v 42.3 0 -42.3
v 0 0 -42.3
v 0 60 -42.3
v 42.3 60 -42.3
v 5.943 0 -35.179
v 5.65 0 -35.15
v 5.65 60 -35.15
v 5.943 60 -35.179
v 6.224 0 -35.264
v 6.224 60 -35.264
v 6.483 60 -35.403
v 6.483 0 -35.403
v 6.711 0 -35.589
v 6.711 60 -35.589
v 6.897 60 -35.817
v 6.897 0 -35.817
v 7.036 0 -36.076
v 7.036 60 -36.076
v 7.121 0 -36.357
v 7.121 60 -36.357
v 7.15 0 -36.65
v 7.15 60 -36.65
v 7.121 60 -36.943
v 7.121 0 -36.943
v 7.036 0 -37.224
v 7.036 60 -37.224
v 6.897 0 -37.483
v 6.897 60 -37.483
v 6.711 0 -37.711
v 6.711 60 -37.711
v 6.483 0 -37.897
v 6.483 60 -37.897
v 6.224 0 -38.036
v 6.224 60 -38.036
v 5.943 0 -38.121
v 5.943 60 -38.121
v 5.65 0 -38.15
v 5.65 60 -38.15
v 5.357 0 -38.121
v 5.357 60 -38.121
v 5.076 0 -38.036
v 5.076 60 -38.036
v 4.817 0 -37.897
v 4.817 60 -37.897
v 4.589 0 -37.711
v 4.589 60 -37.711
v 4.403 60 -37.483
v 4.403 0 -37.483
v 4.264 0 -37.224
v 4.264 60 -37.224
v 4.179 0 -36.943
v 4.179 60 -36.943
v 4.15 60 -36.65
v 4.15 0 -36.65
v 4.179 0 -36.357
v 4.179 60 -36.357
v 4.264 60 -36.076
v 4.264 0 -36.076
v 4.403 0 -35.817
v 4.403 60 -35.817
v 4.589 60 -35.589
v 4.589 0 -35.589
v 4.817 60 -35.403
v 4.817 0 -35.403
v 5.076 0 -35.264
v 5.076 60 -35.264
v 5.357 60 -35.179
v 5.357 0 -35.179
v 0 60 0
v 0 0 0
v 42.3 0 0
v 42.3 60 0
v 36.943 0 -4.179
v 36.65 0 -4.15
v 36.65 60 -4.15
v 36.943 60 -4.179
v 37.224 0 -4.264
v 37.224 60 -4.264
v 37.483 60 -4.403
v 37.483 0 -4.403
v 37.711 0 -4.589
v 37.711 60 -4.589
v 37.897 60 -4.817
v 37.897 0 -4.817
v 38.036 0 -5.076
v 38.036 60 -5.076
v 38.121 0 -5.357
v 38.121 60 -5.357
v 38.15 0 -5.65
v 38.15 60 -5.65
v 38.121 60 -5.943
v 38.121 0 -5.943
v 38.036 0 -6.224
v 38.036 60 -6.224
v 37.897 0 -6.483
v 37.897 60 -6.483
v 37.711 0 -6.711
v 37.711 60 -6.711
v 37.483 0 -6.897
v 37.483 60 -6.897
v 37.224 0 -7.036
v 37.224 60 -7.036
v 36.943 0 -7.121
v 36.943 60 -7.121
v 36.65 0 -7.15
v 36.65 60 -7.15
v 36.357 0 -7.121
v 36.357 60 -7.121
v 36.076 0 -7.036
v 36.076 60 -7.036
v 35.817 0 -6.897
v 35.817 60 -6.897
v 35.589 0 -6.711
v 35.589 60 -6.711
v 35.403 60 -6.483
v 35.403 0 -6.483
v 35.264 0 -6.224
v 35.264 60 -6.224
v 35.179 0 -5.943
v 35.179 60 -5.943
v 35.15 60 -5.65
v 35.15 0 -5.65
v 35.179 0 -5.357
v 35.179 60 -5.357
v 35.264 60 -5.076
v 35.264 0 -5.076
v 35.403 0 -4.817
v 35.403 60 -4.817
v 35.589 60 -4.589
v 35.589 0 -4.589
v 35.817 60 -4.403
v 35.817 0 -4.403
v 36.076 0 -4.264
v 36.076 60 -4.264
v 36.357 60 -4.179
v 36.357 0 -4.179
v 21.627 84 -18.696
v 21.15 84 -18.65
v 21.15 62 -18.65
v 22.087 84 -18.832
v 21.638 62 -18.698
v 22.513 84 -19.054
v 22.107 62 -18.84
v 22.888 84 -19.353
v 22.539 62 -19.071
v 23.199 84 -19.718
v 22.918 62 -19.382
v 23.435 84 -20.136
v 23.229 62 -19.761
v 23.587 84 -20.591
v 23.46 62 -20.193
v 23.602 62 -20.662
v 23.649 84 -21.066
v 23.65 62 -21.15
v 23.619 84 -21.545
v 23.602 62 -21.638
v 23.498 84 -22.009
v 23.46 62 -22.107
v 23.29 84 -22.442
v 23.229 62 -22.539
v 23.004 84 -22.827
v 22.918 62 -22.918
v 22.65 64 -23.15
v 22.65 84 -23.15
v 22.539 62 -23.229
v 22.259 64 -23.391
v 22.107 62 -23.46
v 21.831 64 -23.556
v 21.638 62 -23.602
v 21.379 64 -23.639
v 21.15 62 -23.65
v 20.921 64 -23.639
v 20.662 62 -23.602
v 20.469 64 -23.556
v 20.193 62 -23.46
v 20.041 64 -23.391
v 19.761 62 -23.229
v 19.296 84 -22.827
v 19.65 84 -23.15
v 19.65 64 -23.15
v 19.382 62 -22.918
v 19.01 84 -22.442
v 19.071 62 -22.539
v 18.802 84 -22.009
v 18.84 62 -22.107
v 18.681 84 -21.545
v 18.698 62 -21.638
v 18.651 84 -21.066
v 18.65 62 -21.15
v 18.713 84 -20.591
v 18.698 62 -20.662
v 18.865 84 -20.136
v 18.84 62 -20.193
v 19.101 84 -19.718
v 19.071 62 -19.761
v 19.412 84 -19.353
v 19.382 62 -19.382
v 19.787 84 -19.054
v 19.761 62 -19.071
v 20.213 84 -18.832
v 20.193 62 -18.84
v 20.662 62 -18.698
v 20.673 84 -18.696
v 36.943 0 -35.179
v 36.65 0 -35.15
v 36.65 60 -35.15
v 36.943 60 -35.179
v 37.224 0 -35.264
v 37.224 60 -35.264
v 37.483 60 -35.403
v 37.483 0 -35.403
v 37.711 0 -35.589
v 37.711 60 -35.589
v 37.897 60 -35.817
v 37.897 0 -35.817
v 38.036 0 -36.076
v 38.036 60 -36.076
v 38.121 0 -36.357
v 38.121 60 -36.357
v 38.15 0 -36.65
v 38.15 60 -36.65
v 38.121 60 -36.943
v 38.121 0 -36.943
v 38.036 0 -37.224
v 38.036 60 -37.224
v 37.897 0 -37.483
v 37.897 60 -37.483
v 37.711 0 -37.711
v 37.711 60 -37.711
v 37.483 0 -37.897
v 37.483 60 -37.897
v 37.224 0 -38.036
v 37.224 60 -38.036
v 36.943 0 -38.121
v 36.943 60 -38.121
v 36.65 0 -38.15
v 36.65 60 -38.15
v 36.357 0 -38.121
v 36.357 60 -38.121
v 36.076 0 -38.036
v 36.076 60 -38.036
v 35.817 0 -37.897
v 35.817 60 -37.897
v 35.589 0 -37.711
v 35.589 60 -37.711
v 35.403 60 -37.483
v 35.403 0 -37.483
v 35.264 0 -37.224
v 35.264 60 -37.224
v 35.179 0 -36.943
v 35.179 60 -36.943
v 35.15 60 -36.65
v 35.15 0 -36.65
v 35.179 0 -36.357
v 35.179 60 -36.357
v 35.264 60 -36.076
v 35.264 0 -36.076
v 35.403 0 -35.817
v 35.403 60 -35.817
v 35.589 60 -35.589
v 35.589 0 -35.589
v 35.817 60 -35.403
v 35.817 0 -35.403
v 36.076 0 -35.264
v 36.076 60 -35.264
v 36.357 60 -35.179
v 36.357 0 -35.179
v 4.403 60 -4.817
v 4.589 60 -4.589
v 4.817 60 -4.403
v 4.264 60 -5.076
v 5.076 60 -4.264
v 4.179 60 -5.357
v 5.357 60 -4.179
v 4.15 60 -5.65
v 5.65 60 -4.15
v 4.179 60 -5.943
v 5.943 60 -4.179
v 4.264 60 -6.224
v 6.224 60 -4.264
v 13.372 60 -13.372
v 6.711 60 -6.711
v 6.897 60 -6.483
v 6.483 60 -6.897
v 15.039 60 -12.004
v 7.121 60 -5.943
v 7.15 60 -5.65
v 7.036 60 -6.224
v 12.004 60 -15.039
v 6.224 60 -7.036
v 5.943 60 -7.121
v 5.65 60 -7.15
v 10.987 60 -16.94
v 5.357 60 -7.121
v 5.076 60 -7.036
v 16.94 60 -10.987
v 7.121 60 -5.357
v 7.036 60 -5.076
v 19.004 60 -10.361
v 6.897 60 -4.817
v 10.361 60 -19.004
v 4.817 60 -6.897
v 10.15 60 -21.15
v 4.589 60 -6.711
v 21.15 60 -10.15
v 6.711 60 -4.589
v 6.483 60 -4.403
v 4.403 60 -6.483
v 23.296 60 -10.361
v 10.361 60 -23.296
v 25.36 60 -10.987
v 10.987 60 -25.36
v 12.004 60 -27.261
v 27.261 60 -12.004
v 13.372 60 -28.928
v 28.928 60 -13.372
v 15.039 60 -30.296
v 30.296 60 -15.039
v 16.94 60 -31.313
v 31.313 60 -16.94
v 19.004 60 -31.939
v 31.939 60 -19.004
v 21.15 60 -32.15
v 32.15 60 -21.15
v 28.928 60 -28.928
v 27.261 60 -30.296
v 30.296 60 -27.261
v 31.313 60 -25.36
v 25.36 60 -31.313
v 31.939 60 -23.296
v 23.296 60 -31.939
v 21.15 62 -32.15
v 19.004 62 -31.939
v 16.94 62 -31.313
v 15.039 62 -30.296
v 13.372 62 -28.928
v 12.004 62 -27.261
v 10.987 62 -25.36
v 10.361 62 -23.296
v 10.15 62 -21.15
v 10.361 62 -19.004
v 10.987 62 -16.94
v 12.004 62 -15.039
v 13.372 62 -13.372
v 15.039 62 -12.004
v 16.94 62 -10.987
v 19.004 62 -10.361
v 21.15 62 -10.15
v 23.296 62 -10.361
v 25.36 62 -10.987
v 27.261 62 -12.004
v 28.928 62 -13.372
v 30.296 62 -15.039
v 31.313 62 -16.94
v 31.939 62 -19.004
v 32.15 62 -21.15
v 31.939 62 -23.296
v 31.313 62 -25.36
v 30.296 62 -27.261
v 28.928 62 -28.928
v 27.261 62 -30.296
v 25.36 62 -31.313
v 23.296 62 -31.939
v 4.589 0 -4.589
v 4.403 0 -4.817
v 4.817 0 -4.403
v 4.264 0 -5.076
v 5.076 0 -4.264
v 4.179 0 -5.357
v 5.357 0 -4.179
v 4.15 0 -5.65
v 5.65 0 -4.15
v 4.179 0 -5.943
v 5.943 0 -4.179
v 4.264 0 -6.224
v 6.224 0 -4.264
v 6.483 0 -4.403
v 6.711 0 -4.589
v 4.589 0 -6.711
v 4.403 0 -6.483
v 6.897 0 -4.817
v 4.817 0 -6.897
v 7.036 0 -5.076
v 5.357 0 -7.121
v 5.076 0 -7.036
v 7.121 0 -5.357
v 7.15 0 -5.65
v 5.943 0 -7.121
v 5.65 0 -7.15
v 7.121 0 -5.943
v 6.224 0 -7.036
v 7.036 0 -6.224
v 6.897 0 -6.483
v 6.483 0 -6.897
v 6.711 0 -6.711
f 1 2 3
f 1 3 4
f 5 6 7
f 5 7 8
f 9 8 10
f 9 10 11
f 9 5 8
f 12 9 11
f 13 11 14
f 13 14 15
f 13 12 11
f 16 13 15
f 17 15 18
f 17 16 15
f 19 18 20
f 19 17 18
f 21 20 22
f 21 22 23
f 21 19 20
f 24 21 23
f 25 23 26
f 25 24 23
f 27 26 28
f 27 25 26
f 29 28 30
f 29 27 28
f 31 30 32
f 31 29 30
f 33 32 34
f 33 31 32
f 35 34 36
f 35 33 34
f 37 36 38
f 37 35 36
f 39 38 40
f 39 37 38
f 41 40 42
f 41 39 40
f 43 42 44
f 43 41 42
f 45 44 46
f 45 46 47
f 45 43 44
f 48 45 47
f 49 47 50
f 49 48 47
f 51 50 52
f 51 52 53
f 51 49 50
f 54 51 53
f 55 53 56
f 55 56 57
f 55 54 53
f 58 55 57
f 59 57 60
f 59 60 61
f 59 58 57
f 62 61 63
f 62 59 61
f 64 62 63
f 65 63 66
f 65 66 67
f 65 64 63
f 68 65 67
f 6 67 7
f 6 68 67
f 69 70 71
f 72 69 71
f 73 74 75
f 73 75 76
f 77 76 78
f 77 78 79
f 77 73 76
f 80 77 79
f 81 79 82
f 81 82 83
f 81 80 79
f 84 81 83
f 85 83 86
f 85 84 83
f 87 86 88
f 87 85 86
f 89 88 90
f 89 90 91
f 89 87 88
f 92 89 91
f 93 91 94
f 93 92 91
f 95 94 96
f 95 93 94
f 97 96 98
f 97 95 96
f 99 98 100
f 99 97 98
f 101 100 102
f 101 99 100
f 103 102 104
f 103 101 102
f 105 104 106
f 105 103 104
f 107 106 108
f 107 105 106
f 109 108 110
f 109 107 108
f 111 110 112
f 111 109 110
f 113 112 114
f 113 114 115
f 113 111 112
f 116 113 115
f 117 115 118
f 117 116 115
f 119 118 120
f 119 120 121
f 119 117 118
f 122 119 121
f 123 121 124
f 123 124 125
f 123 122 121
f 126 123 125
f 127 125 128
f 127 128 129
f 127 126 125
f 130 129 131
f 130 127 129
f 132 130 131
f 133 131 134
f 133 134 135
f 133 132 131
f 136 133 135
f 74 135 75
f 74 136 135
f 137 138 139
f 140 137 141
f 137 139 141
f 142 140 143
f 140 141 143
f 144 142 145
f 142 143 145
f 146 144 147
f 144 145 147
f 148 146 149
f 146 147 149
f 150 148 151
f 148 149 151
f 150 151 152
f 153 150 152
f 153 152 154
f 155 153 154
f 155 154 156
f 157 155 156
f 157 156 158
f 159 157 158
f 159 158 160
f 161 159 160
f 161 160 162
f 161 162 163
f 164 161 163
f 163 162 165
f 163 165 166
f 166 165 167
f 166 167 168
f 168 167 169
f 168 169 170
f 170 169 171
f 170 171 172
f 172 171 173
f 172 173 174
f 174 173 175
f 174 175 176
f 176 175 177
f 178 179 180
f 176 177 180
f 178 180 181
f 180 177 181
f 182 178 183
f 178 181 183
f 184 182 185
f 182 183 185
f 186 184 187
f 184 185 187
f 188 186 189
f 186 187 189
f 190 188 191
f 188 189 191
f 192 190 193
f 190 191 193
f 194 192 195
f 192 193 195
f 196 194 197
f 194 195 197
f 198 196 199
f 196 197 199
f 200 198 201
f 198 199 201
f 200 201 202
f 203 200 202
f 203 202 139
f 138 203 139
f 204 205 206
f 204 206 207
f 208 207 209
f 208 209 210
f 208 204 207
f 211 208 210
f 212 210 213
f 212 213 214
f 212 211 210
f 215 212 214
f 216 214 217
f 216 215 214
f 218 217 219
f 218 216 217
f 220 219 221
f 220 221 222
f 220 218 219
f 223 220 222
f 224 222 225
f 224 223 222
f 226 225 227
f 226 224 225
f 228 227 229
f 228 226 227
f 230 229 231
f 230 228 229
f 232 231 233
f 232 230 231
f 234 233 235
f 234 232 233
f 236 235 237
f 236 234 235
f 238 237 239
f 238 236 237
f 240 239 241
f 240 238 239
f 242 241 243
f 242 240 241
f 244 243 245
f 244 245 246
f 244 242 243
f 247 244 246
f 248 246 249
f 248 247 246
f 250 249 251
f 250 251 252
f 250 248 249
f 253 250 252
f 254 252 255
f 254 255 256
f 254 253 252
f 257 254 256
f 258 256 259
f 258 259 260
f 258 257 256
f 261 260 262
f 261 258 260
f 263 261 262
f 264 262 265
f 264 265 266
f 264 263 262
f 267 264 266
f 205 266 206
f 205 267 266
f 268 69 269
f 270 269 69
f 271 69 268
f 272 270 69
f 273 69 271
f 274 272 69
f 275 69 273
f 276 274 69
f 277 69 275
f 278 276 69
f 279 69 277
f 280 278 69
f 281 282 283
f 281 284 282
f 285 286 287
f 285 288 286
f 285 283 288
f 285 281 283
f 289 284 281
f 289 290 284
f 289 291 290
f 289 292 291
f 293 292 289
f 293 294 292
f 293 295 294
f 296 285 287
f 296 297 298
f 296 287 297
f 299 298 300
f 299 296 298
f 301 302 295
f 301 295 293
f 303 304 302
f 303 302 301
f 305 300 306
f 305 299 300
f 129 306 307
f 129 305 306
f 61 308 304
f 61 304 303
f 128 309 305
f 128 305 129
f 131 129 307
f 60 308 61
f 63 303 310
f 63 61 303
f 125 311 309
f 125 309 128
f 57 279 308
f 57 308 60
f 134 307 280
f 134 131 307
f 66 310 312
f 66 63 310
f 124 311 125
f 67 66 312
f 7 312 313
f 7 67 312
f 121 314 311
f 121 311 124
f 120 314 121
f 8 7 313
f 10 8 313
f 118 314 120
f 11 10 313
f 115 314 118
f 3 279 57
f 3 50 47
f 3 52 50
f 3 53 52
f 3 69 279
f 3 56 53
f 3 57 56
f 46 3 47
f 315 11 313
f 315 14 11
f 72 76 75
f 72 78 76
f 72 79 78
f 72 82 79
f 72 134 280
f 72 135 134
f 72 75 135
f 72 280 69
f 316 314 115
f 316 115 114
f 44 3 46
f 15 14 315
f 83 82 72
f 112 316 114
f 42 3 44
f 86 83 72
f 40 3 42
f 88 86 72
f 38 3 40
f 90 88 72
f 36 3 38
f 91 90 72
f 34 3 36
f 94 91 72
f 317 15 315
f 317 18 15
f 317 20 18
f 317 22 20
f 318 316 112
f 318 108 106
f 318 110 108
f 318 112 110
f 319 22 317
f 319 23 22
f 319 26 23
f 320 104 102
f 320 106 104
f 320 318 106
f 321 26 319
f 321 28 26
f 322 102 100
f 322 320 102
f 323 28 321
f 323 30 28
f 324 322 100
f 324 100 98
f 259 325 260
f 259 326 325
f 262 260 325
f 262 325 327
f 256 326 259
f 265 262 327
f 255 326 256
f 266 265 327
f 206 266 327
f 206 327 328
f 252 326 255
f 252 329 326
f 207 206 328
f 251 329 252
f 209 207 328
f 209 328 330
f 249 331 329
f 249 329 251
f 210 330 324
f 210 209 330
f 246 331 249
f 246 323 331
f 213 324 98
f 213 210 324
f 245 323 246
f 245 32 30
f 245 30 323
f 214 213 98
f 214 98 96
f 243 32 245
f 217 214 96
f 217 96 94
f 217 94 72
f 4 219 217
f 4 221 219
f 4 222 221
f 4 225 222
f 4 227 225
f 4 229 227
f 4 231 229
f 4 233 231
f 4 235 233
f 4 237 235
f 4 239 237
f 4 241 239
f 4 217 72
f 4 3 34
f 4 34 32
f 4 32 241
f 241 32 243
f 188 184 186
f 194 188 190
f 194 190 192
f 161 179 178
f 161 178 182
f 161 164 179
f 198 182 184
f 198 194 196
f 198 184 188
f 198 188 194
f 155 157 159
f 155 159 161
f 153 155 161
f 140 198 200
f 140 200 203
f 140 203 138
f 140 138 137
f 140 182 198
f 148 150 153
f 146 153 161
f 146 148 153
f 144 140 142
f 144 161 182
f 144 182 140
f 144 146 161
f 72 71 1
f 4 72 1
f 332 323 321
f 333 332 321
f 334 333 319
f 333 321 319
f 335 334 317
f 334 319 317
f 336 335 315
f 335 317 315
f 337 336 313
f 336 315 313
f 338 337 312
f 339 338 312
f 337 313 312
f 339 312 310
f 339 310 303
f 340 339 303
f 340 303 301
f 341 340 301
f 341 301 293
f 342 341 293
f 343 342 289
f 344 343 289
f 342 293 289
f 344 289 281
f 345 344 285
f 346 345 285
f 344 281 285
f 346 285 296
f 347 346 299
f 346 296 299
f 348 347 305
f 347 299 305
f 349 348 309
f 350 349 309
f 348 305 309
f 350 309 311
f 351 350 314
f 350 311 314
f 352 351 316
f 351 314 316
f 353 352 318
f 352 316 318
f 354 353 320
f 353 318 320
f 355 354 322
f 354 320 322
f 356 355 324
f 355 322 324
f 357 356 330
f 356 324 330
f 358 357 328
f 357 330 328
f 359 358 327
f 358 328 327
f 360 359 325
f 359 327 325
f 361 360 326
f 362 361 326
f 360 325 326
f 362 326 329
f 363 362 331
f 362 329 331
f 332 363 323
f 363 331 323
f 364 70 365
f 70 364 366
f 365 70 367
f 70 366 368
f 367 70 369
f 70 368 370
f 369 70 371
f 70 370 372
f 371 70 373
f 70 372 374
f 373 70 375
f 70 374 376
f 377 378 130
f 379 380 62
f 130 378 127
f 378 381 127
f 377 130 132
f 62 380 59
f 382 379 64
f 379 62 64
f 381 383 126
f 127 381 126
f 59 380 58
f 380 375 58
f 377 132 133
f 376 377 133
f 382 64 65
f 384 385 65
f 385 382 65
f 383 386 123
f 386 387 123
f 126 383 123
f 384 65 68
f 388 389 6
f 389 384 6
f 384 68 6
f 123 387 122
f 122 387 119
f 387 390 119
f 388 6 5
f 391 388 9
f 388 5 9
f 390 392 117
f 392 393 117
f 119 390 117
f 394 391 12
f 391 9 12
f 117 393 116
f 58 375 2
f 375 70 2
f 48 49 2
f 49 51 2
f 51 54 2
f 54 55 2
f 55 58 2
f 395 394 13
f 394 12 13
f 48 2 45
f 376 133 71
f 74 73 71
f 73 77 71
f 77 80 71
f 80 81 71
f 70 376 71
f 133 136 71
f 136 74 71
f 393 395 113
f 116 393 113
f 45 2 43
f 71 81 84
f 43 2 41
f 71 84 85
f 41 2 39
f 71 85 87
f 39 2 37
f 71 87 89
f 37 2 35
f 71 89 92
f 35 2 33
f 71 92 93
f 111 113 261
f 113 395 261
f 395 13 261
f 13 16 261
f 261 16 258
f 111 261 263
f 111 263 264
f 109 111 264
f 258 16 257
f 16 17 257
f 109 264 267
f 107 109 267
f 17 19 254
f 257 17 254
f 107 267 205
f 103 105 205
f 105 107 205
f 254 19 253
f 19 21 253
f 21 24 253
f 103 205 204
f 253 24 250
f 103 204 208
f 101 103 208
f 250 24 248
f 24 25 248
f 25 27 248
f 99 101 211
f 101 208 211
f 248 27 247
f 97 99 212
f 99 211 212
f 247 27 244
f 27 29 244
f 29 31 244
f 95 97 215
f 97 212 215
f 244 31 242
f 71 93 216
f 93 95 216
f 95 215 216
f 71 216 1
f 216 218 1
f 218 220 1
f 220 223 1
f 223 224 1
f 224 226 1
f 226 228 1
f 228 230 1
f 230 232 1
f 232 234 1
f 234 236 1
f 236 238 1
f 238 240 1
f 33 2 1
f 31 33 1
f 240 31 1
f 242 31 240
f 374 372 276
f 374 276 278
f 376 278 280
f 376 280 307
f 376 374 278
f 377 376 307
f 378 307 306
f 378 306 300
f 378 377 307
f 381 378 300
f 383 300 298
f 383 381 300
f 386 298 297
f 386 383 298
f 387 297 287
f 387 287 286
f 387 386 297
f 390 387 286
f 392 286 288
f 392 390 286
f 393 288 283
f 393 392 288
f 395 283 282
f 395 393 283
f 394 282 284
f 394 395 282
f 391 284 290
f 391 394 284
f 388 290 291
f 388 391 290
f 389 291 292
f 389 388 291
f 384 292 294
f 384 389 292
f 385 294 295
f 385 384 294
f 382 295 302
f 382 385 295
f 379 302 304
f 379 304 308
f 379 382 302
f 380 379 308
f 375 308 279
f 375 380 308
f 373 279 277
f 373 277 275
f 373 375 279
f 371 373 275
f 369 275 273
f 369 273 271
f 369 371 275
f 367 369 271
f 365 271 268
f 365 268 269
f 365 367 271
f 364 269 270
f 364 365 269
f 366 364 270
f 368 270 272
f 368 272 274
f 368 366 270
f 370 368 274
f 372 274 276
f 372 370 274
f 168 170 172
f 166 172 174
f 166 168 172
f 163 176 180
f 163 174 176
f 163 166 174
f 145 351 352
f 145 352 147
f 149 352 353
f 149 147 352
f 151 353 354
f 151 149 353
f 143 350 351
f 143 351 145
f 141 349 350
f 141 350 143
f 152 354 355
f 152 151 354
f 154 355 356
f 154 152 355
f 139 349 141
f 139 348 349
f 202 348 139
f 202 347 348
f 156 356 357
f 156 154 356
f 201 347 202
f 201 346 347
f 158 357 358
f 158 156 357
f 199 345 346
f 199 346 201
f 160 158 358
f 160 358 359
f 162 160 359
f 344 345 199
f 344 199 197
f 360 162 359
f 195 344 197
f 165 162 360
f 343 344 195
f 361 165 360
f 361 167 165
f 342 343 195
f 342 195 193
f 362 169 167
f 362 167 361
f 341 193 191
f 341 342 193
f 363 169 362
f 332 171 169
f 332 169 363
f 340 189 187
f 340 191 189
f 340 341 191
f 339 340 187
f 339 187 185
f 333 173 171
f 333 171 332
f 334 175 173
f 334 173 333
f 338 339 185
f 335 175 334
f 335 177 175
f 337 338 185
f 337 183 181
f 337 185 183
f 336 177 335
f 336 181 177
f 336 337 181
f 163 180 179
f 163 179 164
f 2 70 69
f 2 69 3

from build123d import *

# Parameters (mm, degrees)
SKETCH_1_W          = 42.3
SKETCH_1_H          = 42.3
SKETCH_1_R          = 1.5
EXTRUDE_1_DEPTH     = 60
SKETCH_2_R          = 11
EXTRUDE_2_DEPTH     = 2
SKETCH_3_R          = 2.5
EXTRUDE_3_DEPTH     = 22
SKETCH_4_W          = 5
SKETCH_4_H          = 0.5
CUT_EXTRUDE_1_DEPTH = 20


with BuildPart() as part:
    # Эскиз1 → Бобышка-Вытянуть1 (new body)
    with BuildSketch(Plane(origin=(0, 0, 0), x_dir=(1, 0, 0), z_dir=(0, 1, 0))):
        with Locations((21.15, 21.15)):
            Rectangle(SKETCH_1_W, SKETCH_1_H)
        with Locations(Location((5.65, 36.65, 0), (0, 0, 270))):
            Circle(SKETCH_1_R, mode=Mode.SUBTRACT)
        with Locations(Location((36.65, 36.65, 0), (0, 0, 270))):
            Circle(SKETCH_1_R, mode=Mode.SUBTRACT)
        with Locations(Location((36.65, 5.65, 0), (0, 0, 270))):
            Circle(SKETCH_1_R, mode=Mode.SUBTRACT)
        with Locations(Location((5.65, 5.65, 0), (0, 0, 270))):
            Circle(SKETCH_1_R, mode=Mode.SUBTRACT)
    extrude(amount=EXTRUDE_1_DEPTH)

    # Эскиз2 → Бобышка-Вытянуть2 (add)
    with BuildSketch(Plane(origin=(0, 60, 0), x_dir=(1, 0, 0), z_dir=(0, 1, 0))):
        with Locations(Location((21.15, 21.15, 0), (0, 0, 90))):
            Circle(SKETCH_2_R)
    extrude(amount=EXTRUDE_2_DEPTH)

    # Эскиз3 → Бобышка-Вытянуть3 (add)
    with BuildSketch(Plane(origin=(0, 62, 0), x_dir=(1, 0, 0), z_dir=(0, 1, 0))):
        with Locations(Location((21.15, 21.15, 0), (0, 0, 270))):
            Circle(SKETCH_3_R)
    extrude(amount=EXTRUDE_3_DEPTH)

    # Эскиз4 → Вырез-Вытянуть1 (cut)
    with BuildSketch(Plane(origin=(0, 84, 0), x_dir=(1, 0, 0), z_dir=(0, 1, 0))):
        with Locations((21.15, 23.4)):
            Rectangle(SKETCH_4_W, SKETCH_4_H)
    extrude(amount=-CUT_EXTRUDE_1_DEPTH, mode=Mode.SUBTRACT)


solid = part.part
